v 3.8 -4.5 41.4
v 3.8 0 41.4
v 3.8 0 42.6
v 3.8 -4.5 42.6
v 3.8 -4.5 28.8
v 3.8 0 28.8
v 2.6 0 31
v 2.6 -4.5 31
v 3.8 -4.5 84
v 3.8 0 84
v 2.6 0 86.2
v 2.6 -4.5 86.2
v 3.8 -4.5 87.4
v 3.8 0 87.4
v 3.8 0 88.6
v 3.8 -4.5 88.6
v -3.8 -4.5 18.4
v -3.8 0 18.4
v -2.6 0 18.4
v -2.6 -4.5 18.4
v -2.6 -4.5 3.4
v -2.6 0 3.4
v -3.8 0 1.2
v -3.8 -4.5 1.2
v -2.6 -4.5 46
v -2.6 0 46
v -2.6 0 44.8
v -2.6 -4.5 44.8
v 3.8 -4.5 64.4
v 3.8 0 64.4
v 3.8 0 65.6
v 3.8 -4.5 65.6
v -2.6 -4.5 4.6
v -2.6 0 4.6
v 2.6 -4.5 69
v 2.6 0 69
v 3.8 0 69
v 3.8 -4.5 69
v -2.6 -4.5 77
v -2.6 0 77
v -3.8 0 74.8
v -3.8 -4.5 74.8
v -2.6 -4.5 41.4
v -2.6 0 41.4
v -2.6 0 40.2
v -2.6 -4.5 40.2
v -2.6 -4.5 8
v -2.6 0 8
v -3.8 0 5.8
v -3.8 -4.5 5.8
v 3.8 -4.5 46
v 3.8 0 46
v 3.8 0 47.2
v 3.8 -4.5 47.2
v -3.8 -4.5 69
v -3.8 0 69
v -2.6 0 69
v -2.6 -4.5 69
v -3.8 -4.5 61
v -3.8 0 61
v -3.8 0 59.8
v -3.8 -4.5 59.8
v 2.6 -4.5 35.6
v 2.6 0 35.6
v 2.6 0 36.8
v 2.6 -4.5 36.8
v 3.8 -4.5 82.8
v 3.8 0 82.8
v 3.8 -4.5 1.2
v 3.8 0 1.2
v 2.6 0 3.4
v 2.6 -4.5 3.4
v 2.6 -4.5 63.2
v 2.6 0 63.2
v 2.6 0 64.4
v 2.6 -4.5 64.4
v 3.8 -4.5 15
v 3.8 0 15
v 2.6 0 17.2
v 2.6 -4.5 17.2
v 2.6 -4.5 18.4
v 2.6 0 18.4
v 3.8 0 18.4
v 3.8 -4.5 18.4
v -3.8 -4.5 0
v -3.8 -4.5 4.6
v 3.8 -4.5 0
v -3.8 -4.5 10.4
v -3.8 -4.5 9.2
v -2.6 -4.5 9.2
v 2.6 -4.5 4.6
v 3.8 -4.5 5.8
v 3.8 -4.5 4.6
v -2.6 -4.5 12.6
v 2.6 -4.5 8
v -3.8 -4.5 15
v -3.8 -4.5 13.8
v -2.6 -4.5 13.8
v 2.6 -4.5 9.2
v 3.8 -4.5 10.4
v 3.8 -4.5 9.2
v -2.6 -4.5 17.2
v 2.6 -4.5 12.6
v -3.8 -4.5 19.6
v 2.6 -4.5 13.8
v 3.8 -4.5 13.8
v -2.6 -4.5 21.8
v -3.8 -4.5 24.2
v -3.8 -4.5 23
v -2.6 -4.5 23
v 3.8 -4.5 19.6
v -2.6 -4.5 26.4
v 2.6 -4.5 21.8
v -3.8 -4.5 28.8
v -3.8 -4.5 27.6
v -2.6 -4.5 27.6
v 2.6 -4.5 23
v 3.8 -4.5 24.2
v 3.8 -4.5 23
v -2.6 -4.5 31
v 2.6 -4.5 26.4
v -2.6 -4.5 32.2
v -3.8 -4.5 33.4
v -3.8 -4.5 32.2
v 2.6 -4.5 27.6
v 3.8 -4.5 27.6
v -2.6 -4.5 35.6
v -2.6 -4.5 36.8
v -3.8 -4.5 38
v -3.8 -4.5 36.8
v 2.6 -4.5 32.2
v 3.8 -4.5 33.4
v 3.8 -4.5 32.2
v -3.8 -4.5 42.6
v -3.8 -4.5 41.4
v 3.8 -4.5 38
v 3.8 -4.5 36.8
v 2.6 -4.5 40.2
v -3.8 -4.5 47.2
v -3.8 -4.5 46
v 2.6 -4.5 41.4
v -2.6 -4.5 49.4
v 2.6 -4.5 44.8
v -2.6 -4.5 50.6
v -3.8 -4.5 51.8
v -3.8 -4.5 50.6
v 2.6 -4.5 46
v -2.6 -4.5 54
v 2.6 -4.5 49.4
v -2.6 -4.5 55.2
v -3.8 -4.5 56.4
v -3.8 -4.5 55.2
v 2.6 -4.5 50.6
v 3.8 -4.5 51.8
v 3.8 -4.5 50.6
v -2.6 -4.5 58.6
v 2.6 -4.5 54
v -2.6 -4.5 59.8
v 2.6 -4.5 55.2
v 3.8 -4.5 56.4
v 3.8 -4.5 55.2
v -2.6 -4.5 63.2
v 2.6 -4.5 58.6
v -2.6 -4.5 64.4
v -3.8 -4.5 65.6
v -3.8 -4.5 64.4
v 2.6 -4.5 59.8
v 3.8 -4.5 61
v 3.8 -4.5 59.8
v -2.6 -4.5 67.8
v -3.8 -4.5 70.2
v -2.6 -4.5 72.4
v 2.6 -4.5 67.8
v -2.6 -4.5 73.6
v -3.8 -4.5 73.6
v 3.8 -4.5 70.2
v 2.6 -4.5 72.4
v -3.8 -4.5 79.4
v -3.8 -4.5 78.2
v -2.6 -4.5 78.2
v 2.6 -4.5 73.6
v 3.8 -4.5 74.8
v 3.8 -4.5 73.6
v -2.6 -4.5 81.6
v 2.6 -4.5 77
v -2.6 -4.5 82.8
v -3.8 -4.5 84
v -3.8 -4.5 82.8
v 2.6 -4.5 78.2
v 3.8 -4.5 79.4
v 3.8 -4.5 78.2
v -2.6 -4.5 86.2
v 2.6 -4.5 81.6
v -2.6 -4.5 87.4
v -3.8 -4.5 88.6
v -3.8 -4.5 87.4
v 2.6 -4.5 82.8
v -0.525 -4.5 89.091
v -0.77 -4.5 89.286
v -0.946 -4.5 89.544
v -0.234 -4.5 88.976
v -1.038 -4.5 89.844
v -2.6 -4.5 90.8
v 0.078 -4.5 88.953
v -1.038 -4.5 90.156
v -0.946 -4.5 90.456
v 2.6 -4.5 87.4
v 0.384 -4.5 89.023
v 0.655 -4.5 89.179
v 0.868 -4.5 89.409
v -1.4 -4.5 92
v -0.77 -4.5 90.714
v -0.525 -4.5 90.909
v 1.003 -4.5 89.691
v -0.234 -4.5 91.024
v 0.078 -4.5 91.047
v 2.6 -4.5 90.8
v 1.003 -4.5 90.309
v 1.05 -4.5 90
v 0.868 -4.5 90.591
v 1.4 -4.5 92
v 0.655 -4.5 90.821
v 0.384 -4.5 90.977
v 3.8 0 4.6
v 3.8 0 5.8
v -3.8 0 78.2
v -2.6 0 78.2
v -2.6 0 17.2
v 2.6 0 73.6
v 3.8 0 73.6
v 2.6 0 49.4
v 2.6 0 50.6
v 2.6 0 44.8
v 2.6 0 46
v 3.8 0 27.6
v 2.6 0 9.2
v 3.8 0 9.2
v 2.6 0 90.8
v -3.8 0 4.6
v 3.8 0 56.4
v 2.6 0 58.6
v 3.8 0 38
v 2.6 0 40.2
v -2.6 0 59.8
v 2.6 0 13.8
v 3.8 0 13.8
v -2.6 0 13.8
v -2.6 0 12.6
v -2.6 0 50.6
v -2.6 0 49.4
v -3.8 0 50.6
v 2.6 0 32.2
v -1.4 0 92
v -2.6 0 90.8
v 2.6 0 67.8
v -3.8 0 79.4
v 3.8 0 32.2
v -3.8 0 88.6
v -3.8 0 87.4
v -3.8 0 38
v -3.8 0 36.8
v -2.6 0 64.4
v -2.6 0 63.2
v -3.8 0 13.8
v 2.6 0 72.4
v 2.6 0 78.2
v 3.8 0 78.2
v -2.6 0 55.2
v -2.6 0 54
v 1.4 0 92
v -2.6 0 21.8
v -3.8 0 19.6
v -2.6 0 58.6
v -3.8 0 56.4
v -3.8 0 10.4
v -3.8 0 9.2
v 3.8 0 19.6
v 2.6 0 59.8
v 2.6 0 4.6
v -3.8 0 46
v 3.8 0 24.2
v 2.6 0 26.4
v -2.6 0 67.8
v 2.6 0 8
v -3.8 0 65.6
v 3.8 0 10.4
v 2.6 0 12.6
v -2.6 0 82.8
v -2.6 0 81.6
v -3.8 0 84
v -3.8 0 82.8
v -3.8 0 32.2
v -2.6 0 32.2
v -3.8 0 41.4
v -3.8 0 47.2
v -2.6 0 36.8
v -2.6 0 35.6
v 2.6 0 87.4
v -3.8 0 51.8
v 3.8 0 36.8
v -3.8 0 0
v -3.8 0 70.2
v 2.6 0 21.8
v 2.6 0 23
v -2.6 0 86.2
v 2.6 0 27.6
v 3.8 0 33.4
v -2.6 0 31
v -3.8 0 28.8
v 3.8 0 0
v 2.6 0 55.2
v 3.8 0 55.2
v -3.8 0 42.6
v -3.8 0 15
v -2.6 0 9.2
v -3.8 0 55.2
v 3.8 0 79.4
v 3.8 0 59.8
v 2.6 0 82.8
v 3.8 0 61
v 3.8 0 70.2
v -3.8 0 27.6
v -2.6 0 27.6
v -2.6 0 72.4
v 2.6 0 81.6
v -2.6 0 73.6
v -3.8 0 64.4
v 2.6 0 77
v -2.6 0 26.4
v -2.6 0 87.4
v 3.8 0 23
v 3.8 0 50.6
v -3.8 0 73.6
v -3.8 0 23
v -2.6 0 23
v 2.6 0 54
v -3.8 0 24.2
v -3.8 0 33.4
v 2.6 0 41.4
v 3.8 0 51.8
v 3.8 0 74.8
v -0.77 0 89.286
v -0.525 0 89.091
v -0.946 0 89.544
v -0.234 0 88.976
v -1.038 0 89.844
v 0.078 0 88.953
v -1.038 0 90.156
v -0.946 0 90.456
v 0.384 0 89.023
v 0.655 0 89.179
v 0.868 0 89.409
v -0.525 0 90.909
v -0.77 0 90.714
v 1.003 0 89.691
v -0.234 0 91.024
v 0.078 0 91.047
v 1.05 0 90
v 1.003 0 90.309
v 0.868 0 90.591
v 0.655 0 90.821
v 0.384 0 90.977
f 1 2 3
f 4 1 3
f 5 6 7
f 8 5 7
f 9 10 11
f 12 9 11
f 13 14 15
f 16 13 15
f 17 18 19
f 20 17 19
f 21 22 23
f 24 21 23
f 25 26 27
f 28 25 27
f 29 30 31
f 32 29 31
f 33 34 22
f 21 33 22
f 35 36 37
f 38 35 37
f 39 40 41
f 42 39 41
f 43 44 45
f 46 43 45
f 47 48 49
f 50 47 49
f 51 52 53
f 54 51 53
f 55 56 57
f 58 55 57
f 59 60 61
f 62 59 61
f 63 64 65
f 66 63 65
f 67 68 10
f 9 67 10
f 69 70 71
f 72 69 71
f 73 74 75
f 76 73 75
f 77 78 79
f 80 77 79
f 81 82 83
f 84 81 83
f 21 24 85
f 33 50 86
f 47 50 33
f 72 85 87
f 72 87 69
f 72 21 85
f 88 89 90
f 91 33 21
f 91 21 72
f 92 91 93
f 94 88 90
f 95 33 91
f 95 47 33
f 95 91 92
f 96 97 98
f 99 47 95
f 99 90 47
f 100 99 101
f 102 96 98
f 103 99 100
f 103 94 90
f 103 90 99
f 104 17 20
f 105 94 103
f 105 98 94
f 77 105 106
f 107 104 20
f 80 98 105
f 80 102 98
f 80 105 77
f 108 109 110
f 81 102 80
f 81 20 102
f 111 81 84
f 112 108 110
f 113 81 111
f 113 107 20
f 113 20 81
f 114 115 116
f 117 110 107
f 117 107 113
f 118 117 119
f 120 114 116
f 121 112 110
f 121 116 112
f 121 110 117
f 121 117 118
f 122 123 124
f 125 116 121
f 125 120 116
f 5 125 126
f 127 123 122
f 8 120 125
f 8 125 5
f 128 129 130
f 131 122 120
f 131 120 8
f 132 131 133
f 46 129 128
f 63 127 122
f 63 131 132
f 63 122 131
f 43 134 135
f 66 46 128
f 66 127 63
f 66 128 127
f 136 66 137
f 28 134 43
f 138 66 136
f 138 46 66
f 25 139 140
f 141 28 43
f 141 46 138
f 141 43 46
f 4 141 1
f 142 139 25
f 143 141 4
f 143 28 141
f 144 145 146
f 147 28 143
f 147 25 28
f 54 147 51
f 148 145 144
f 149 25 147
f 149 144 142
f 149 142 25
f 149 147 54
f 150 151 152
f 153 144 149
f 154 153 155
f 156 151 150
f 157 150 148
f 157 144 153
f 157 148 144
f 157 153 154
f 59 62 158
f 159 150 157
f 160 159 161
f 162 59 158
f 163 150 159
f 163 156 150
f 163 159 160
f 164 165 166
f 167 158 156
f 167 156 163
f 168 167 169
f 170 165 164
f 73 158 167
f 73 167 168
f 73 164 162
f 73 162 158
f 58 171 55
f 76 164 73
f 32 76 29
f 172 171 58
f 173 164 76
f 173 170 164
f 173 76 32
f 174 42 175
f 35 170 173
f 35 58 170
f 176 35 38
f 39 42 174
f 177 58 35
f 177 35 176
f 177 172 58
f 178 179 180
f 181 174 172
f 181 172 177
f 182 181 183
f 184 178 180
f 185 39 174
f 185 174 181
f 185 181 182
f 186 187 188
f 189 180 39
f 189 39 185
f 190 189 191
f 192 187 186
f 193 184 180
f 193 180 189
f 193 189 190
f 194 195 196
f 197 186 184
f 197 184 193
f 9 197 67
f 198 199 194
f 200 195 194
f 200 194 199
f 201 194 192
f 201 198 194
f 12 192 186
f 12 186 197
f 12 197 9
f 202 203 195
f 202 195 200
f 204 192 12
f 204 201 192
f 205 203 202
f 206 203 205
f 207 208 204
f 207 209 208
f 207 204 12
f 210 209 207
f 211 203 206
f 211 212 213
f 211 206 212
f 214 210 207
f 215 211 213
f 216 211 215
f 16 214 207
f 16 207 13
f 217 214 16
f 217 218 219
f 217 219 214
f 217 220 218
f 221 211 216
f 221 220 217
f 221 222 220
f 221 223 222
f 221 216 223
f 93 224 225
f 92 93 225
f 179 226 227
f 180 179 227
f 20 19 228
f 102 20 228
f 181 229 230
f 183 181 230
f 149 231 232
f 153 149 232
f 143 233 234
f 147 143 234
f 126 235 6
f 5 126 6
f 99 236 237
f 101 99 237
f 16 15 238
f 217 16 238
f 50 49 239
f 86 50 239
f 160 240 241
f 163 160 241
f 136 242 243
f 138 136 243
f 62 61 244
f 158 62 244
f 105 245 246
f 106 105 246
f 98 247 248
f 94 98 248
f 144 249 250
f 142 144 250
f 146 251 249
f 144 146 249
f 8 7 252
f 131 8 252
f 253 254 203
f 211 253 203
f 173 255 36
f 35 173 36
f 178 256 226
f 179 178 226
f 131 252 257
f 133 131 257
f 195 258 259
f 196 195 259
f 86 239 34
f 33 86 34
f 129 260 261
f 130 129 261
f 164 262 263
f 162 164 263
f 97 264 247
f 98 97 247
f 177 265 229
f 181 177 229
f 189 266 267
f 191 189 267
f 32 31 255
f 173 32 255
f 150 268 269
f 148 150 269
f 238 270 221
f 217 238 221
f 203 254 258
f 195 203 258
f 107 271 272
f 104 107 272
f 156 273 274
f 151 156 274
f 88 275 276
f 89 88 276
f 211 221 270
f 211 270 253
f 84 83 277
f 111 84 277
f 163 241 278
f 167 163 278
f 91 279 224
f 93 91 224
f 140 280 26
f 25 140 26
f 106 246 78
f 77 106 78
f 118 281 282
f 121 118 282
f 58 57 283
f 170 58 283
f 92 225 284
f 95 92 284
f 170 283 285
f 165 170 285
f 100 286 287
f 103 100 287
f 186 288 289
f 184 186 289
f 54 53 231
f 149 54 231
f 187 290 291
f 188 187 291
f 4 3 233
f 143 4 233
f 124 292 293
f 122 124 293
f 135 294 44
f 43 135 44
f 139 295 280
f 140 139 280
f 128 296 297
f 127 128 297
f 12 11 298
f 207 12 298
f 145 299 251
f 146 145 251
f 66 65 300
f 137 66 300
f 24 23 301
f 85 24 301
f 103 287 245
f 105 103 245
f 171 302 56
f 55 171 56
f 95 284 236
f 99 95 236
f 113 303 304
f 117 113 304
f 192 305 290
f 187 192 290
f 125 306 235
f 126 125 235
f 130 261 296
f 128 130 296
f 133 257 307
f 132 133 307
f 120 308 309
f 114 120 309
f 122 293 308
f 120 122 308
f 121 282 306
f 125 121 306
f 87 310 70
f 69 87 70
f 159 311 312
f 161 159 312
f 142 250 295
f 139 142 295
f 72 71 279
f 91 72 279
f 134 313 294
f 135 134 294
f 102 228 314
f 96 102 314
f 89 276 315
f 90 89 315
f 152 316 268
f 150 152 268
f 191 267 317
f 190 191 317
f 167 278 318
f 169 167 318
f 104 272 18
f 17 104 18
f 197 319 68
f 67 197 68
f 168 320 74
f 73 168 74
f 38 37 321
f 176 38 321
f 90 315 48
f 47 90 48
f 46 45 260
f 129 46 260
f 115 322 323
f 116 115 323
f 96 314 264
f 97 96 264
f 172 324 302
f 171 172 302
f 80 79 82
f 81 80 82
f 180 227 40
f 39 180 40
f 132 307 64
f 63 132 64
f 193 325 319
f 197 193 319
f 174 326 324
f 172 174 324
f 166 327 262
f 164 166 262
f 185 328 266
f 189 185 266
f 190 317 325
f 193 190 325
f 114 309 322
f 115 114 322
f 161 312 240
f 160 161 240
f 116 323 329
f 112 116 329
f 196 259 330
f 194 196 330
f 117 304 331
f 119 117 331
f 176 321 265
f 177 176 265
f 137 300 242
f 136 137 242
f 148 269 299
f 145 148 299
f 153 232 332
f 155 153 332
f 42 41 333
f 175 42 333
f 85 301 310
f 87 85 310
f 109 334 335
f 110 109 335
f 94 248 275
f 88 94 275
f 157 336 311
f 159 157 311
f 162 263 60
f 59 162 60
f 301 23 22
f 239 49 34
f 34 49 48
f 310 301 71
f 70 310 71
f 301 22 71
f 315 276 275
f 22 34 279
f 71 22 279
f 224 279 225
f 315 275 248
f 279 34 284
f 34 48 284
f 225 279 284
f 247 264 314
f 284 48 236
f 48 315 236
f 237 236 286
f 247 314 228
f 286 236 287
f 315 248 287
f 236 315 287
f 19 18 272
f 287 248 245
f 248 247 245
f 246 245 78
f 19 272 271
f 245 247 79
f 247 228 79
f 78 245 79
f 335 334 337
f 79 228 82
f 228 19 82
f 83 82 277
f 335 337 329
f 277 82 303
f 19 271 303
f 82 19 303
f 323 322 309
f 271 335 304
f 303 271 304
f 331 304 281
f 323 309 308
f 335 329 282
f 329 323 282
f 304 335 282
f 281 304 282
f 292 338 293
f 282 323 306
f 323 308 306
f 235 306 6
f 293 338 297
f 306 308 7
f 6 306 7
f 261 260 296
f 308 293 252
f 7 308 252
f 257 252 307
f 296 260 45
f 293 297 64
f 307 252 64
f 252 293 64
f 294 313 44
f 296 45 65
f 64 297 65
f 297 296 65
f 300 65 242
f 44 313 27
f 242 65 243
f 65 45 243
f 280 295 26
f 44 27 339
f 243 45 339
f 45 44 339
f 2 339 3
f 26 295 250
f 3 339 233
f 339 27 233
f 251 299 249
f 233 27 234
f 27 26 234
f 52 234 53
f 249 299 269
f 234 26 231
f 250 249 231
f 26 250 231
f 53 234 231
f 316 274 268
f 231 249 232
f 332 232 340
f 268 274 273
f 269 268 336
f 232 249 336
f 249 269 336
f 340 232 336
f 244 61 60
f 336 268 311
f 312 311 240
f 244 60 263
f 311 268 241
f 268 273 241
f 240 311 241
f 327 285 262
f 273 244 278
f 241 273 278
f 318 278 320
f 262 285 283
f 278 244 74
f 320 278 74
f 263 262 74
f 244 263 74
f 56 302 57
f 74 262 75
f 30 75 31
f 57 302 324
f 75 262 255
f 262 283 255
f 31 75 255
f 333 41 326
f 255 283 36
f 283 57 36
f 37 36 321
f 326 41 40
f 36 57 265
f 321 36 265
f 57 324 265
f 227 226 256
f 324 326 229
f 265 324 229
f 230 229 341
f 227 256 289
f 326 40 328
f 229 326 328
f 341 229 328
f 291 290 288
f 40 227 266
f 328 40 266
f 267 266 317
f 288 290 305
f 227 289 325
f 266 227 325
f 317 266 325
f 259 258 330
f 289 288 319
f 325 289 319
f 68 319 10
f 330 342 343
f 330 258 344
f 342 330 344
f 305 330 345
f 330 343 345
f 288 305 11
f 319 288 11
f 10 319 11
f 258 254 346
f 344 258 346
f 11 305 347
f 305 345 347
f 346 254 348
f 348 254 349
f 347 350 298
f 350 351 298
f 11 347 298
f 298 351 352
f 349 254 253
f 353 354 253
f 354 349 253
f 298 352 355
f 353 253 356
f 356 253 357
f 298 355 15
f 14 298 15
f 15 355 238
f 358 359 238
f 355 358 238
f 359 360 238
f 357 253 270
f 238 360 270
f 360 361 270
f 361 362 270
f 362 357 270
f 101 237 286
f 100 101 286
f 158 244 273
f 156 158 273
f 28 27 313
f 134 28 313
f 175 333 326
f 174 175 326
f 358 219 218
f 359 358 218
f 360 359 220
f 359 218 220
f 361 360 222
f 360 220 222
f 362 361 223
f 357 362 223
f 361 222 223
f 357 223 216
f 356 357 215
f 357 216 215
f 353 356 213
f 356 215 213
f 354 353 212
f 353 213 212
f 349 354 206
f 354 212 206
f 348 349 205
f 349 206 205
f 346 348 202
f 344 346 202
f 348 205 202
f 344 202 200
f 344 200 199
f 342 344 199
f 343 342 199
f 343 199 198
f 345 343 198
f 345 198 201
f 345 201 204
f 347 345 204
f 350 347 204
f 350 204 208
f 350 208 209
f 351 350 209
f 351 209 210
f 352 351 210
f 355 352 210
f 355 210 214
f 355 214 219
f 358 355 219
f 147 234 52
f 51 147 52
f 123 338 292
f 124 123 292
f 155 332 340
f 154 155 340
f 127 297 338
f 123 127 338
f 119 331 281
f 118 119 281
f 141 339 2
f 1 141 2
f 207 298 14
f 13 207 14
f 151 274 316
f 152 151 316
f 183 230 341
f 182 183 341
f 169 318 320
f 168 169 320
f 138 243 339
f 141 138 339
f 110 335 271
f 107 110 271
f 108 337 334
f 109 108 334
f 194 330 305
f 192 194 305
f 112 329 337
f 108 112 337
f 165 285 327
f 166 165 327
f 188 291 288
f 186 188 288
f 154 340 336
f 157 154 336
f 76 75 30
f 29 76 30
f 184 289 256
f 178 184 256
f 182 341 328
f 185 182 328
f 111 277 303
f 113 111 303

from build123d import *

# Parameters (mm, degrees)
F1_DEPTH = 4.5
F2_SIZE  = 1.19999
F3_R     = 1.05
F4_DEPTH = 25


# Not quite as in the source:
# - a fillet or chamfer is up to 0.001 mm smaller than in the source, because OpenCascade refuses the exact size


with BuildPart() as f1:
    # F0 (on Front) → F1 (new body)
    with BuildSketch(Plane.XZ):
        Polygon((-3.8, 1.2), (-3.8, 0), (-2.6, 0), (2.6, 0), (3.8, 0), (3.8, 1.2), (2.6, 3.4), (2.6, 4.6), (3.8, 4.6), (3.8, 5.8), (2.6, 8), (2.6, 9.2), (3.8, 9.2), (3.8, 10.4), (2.6, 12.6), (2.6, 13.8), (3.8, 13.8), (3.8, 15), (2.6, 17.2), (2.6, 18.4), (3.8, 18.4), (3.8, 19.6), (2.6, 21.8), (2.6, 23), (3.8, 23), (3.8, 24.2), (2.6, 26.4), (2.6, 27.6), (3.8, 27.6), (3.8, 28.8), (2.6, 31), (2.6, 32.2), (3.8, 32.2), (3.8, 33.4), (2.6, 35.6), (2.6, 36.8), (3.8, 36.8), (3.8, 38), (2.6, 40.2), (2.6, 41.4), (3.8, 41.4), (3.8, 42.6), (2.6, 44.8), (2.6, 46), (3.8, 46), (3.8, 47.2), (2.6, 49.4), (2.6, 50.6), (3.8, 50.6), (3.8, 51.8), (2.6, 54), (2.6, 55.2), (3.8, 55.2), (3.8, 56.4), (2.6, 58.6), (2.6, 59.8), (3.8, 59.8), (3.8, 61), (2.6, 63.2), (2.6, 64.4), (3.8, 64.4), (3.8, 65.6), (2.6, 67.8), (2.6, 69), (3.8, 69), (3.8, 70.2), (2.6, 72.4), (2.6, 73.6), (3.8, 73.6), (3.8, 74.8), (2.6, 77), (2.6, 78.2), (3.8, 78.2), (3.8, 79.4), (2.6, 81.6), (2.6, 82.8), (3.8, 82.8), (3.8, 84), (2.6, 86.2), (2.6, 87.4), (3.8, 87.4), (3.8, 88.6), (2.6, 90.8), (2.6, 92), (-2.6, 92), (-2.6, 90.8), (-3.8, 88.6), (-3.8, 87.4), (-2.6, 87.4), (-2.6, 86.2), (-3.8, 84), (-3.8, 82.8), (-2.6, 82.8), (-2.6, 81.6), (-3.8, 79.4), (-3.8, 78.2), (-2.6, 78.2), (-2.6, 77), (-3.8, 74.8), (-3.8, 73.6), (-2.6, 73.6), (-2.6, 72.4), (-3.8, 70.2), (-3.8, 69), (-2.6, 69), (-2.6, 67.8), (-3.8, 65.6), (-3.8, 64.4), (-2.6, 64.4), (-2.6, 63.2), (-3.8, 61), (-3.8, 59.8), (-2.6, 59.8), (-2.6, 58.6), (-3.8, 56.4), (-3.8, 55.2), (-2.6, 55.2), (-2.6, 54), (-3.8, 51.8), (-3.8, 50.6), (-2.6, 50.6), (-2.6, 49.4), (-3.8, 47.2), (-3.8, 46), (-2.6, 46), (-2.6, 44.8), (-3.8, 42.6), (-3.8, 41.4), (-2.6, 41.4), (-2.6, 40.2), (-3.8, 38), (-3.8, 36.8), (-2.6, 36.8), (-2.6, 35.6), (-3.8, 33.4), (-3.8, 32.2), (-2.6, 32.2), (-2.6, 31), (-3.8, 28.8), (-3.8, 27.6), (-2.6, 27.6), (-2.6, 26.4), (-3.8, 24.2), (-3.8, 23), (-2.6, 23), (-2.6, 21.8), (-3.8, 19.6), (-3.8, 18.4), (-2.6, 18.4), (-2.6, 17.2), (-3.8, 15), (-3.8, 13.8), (-2.6, 13.8), (-2.6, 12.6), (-3.8, 10.4), (-3.8, 9.2), (-2.6, 9.2), (-2.6, 8), (-3.8, 5.8), (-3.8, 4.6), (-2.6, 4.6), (-2.6, 3.4), align=None)
    extrude(amount=F1_DEPTH)

    # F2 (size 1.2 in the source; OpenCascade refuses exactly that, so slightly less here)
    f2_edges = [f1.edges().sort_by_distance(p)[0] for p in [
        (2.6, -2.25, 92),
        (-2.6, -2.25, 92),
    ]]
    chamfer(f2_edges, length=F2_SIZE)

    # F3 (on face) → F4 (cut)
    with BuildSketch(Plane.XZ.offset(4.5)):
        with Locations((0, 90)):
            Circle(F3_R)
    extrude(amount=-F4_DEPTH, mode=Mode.SUBTRACT)


solid = f1.part
